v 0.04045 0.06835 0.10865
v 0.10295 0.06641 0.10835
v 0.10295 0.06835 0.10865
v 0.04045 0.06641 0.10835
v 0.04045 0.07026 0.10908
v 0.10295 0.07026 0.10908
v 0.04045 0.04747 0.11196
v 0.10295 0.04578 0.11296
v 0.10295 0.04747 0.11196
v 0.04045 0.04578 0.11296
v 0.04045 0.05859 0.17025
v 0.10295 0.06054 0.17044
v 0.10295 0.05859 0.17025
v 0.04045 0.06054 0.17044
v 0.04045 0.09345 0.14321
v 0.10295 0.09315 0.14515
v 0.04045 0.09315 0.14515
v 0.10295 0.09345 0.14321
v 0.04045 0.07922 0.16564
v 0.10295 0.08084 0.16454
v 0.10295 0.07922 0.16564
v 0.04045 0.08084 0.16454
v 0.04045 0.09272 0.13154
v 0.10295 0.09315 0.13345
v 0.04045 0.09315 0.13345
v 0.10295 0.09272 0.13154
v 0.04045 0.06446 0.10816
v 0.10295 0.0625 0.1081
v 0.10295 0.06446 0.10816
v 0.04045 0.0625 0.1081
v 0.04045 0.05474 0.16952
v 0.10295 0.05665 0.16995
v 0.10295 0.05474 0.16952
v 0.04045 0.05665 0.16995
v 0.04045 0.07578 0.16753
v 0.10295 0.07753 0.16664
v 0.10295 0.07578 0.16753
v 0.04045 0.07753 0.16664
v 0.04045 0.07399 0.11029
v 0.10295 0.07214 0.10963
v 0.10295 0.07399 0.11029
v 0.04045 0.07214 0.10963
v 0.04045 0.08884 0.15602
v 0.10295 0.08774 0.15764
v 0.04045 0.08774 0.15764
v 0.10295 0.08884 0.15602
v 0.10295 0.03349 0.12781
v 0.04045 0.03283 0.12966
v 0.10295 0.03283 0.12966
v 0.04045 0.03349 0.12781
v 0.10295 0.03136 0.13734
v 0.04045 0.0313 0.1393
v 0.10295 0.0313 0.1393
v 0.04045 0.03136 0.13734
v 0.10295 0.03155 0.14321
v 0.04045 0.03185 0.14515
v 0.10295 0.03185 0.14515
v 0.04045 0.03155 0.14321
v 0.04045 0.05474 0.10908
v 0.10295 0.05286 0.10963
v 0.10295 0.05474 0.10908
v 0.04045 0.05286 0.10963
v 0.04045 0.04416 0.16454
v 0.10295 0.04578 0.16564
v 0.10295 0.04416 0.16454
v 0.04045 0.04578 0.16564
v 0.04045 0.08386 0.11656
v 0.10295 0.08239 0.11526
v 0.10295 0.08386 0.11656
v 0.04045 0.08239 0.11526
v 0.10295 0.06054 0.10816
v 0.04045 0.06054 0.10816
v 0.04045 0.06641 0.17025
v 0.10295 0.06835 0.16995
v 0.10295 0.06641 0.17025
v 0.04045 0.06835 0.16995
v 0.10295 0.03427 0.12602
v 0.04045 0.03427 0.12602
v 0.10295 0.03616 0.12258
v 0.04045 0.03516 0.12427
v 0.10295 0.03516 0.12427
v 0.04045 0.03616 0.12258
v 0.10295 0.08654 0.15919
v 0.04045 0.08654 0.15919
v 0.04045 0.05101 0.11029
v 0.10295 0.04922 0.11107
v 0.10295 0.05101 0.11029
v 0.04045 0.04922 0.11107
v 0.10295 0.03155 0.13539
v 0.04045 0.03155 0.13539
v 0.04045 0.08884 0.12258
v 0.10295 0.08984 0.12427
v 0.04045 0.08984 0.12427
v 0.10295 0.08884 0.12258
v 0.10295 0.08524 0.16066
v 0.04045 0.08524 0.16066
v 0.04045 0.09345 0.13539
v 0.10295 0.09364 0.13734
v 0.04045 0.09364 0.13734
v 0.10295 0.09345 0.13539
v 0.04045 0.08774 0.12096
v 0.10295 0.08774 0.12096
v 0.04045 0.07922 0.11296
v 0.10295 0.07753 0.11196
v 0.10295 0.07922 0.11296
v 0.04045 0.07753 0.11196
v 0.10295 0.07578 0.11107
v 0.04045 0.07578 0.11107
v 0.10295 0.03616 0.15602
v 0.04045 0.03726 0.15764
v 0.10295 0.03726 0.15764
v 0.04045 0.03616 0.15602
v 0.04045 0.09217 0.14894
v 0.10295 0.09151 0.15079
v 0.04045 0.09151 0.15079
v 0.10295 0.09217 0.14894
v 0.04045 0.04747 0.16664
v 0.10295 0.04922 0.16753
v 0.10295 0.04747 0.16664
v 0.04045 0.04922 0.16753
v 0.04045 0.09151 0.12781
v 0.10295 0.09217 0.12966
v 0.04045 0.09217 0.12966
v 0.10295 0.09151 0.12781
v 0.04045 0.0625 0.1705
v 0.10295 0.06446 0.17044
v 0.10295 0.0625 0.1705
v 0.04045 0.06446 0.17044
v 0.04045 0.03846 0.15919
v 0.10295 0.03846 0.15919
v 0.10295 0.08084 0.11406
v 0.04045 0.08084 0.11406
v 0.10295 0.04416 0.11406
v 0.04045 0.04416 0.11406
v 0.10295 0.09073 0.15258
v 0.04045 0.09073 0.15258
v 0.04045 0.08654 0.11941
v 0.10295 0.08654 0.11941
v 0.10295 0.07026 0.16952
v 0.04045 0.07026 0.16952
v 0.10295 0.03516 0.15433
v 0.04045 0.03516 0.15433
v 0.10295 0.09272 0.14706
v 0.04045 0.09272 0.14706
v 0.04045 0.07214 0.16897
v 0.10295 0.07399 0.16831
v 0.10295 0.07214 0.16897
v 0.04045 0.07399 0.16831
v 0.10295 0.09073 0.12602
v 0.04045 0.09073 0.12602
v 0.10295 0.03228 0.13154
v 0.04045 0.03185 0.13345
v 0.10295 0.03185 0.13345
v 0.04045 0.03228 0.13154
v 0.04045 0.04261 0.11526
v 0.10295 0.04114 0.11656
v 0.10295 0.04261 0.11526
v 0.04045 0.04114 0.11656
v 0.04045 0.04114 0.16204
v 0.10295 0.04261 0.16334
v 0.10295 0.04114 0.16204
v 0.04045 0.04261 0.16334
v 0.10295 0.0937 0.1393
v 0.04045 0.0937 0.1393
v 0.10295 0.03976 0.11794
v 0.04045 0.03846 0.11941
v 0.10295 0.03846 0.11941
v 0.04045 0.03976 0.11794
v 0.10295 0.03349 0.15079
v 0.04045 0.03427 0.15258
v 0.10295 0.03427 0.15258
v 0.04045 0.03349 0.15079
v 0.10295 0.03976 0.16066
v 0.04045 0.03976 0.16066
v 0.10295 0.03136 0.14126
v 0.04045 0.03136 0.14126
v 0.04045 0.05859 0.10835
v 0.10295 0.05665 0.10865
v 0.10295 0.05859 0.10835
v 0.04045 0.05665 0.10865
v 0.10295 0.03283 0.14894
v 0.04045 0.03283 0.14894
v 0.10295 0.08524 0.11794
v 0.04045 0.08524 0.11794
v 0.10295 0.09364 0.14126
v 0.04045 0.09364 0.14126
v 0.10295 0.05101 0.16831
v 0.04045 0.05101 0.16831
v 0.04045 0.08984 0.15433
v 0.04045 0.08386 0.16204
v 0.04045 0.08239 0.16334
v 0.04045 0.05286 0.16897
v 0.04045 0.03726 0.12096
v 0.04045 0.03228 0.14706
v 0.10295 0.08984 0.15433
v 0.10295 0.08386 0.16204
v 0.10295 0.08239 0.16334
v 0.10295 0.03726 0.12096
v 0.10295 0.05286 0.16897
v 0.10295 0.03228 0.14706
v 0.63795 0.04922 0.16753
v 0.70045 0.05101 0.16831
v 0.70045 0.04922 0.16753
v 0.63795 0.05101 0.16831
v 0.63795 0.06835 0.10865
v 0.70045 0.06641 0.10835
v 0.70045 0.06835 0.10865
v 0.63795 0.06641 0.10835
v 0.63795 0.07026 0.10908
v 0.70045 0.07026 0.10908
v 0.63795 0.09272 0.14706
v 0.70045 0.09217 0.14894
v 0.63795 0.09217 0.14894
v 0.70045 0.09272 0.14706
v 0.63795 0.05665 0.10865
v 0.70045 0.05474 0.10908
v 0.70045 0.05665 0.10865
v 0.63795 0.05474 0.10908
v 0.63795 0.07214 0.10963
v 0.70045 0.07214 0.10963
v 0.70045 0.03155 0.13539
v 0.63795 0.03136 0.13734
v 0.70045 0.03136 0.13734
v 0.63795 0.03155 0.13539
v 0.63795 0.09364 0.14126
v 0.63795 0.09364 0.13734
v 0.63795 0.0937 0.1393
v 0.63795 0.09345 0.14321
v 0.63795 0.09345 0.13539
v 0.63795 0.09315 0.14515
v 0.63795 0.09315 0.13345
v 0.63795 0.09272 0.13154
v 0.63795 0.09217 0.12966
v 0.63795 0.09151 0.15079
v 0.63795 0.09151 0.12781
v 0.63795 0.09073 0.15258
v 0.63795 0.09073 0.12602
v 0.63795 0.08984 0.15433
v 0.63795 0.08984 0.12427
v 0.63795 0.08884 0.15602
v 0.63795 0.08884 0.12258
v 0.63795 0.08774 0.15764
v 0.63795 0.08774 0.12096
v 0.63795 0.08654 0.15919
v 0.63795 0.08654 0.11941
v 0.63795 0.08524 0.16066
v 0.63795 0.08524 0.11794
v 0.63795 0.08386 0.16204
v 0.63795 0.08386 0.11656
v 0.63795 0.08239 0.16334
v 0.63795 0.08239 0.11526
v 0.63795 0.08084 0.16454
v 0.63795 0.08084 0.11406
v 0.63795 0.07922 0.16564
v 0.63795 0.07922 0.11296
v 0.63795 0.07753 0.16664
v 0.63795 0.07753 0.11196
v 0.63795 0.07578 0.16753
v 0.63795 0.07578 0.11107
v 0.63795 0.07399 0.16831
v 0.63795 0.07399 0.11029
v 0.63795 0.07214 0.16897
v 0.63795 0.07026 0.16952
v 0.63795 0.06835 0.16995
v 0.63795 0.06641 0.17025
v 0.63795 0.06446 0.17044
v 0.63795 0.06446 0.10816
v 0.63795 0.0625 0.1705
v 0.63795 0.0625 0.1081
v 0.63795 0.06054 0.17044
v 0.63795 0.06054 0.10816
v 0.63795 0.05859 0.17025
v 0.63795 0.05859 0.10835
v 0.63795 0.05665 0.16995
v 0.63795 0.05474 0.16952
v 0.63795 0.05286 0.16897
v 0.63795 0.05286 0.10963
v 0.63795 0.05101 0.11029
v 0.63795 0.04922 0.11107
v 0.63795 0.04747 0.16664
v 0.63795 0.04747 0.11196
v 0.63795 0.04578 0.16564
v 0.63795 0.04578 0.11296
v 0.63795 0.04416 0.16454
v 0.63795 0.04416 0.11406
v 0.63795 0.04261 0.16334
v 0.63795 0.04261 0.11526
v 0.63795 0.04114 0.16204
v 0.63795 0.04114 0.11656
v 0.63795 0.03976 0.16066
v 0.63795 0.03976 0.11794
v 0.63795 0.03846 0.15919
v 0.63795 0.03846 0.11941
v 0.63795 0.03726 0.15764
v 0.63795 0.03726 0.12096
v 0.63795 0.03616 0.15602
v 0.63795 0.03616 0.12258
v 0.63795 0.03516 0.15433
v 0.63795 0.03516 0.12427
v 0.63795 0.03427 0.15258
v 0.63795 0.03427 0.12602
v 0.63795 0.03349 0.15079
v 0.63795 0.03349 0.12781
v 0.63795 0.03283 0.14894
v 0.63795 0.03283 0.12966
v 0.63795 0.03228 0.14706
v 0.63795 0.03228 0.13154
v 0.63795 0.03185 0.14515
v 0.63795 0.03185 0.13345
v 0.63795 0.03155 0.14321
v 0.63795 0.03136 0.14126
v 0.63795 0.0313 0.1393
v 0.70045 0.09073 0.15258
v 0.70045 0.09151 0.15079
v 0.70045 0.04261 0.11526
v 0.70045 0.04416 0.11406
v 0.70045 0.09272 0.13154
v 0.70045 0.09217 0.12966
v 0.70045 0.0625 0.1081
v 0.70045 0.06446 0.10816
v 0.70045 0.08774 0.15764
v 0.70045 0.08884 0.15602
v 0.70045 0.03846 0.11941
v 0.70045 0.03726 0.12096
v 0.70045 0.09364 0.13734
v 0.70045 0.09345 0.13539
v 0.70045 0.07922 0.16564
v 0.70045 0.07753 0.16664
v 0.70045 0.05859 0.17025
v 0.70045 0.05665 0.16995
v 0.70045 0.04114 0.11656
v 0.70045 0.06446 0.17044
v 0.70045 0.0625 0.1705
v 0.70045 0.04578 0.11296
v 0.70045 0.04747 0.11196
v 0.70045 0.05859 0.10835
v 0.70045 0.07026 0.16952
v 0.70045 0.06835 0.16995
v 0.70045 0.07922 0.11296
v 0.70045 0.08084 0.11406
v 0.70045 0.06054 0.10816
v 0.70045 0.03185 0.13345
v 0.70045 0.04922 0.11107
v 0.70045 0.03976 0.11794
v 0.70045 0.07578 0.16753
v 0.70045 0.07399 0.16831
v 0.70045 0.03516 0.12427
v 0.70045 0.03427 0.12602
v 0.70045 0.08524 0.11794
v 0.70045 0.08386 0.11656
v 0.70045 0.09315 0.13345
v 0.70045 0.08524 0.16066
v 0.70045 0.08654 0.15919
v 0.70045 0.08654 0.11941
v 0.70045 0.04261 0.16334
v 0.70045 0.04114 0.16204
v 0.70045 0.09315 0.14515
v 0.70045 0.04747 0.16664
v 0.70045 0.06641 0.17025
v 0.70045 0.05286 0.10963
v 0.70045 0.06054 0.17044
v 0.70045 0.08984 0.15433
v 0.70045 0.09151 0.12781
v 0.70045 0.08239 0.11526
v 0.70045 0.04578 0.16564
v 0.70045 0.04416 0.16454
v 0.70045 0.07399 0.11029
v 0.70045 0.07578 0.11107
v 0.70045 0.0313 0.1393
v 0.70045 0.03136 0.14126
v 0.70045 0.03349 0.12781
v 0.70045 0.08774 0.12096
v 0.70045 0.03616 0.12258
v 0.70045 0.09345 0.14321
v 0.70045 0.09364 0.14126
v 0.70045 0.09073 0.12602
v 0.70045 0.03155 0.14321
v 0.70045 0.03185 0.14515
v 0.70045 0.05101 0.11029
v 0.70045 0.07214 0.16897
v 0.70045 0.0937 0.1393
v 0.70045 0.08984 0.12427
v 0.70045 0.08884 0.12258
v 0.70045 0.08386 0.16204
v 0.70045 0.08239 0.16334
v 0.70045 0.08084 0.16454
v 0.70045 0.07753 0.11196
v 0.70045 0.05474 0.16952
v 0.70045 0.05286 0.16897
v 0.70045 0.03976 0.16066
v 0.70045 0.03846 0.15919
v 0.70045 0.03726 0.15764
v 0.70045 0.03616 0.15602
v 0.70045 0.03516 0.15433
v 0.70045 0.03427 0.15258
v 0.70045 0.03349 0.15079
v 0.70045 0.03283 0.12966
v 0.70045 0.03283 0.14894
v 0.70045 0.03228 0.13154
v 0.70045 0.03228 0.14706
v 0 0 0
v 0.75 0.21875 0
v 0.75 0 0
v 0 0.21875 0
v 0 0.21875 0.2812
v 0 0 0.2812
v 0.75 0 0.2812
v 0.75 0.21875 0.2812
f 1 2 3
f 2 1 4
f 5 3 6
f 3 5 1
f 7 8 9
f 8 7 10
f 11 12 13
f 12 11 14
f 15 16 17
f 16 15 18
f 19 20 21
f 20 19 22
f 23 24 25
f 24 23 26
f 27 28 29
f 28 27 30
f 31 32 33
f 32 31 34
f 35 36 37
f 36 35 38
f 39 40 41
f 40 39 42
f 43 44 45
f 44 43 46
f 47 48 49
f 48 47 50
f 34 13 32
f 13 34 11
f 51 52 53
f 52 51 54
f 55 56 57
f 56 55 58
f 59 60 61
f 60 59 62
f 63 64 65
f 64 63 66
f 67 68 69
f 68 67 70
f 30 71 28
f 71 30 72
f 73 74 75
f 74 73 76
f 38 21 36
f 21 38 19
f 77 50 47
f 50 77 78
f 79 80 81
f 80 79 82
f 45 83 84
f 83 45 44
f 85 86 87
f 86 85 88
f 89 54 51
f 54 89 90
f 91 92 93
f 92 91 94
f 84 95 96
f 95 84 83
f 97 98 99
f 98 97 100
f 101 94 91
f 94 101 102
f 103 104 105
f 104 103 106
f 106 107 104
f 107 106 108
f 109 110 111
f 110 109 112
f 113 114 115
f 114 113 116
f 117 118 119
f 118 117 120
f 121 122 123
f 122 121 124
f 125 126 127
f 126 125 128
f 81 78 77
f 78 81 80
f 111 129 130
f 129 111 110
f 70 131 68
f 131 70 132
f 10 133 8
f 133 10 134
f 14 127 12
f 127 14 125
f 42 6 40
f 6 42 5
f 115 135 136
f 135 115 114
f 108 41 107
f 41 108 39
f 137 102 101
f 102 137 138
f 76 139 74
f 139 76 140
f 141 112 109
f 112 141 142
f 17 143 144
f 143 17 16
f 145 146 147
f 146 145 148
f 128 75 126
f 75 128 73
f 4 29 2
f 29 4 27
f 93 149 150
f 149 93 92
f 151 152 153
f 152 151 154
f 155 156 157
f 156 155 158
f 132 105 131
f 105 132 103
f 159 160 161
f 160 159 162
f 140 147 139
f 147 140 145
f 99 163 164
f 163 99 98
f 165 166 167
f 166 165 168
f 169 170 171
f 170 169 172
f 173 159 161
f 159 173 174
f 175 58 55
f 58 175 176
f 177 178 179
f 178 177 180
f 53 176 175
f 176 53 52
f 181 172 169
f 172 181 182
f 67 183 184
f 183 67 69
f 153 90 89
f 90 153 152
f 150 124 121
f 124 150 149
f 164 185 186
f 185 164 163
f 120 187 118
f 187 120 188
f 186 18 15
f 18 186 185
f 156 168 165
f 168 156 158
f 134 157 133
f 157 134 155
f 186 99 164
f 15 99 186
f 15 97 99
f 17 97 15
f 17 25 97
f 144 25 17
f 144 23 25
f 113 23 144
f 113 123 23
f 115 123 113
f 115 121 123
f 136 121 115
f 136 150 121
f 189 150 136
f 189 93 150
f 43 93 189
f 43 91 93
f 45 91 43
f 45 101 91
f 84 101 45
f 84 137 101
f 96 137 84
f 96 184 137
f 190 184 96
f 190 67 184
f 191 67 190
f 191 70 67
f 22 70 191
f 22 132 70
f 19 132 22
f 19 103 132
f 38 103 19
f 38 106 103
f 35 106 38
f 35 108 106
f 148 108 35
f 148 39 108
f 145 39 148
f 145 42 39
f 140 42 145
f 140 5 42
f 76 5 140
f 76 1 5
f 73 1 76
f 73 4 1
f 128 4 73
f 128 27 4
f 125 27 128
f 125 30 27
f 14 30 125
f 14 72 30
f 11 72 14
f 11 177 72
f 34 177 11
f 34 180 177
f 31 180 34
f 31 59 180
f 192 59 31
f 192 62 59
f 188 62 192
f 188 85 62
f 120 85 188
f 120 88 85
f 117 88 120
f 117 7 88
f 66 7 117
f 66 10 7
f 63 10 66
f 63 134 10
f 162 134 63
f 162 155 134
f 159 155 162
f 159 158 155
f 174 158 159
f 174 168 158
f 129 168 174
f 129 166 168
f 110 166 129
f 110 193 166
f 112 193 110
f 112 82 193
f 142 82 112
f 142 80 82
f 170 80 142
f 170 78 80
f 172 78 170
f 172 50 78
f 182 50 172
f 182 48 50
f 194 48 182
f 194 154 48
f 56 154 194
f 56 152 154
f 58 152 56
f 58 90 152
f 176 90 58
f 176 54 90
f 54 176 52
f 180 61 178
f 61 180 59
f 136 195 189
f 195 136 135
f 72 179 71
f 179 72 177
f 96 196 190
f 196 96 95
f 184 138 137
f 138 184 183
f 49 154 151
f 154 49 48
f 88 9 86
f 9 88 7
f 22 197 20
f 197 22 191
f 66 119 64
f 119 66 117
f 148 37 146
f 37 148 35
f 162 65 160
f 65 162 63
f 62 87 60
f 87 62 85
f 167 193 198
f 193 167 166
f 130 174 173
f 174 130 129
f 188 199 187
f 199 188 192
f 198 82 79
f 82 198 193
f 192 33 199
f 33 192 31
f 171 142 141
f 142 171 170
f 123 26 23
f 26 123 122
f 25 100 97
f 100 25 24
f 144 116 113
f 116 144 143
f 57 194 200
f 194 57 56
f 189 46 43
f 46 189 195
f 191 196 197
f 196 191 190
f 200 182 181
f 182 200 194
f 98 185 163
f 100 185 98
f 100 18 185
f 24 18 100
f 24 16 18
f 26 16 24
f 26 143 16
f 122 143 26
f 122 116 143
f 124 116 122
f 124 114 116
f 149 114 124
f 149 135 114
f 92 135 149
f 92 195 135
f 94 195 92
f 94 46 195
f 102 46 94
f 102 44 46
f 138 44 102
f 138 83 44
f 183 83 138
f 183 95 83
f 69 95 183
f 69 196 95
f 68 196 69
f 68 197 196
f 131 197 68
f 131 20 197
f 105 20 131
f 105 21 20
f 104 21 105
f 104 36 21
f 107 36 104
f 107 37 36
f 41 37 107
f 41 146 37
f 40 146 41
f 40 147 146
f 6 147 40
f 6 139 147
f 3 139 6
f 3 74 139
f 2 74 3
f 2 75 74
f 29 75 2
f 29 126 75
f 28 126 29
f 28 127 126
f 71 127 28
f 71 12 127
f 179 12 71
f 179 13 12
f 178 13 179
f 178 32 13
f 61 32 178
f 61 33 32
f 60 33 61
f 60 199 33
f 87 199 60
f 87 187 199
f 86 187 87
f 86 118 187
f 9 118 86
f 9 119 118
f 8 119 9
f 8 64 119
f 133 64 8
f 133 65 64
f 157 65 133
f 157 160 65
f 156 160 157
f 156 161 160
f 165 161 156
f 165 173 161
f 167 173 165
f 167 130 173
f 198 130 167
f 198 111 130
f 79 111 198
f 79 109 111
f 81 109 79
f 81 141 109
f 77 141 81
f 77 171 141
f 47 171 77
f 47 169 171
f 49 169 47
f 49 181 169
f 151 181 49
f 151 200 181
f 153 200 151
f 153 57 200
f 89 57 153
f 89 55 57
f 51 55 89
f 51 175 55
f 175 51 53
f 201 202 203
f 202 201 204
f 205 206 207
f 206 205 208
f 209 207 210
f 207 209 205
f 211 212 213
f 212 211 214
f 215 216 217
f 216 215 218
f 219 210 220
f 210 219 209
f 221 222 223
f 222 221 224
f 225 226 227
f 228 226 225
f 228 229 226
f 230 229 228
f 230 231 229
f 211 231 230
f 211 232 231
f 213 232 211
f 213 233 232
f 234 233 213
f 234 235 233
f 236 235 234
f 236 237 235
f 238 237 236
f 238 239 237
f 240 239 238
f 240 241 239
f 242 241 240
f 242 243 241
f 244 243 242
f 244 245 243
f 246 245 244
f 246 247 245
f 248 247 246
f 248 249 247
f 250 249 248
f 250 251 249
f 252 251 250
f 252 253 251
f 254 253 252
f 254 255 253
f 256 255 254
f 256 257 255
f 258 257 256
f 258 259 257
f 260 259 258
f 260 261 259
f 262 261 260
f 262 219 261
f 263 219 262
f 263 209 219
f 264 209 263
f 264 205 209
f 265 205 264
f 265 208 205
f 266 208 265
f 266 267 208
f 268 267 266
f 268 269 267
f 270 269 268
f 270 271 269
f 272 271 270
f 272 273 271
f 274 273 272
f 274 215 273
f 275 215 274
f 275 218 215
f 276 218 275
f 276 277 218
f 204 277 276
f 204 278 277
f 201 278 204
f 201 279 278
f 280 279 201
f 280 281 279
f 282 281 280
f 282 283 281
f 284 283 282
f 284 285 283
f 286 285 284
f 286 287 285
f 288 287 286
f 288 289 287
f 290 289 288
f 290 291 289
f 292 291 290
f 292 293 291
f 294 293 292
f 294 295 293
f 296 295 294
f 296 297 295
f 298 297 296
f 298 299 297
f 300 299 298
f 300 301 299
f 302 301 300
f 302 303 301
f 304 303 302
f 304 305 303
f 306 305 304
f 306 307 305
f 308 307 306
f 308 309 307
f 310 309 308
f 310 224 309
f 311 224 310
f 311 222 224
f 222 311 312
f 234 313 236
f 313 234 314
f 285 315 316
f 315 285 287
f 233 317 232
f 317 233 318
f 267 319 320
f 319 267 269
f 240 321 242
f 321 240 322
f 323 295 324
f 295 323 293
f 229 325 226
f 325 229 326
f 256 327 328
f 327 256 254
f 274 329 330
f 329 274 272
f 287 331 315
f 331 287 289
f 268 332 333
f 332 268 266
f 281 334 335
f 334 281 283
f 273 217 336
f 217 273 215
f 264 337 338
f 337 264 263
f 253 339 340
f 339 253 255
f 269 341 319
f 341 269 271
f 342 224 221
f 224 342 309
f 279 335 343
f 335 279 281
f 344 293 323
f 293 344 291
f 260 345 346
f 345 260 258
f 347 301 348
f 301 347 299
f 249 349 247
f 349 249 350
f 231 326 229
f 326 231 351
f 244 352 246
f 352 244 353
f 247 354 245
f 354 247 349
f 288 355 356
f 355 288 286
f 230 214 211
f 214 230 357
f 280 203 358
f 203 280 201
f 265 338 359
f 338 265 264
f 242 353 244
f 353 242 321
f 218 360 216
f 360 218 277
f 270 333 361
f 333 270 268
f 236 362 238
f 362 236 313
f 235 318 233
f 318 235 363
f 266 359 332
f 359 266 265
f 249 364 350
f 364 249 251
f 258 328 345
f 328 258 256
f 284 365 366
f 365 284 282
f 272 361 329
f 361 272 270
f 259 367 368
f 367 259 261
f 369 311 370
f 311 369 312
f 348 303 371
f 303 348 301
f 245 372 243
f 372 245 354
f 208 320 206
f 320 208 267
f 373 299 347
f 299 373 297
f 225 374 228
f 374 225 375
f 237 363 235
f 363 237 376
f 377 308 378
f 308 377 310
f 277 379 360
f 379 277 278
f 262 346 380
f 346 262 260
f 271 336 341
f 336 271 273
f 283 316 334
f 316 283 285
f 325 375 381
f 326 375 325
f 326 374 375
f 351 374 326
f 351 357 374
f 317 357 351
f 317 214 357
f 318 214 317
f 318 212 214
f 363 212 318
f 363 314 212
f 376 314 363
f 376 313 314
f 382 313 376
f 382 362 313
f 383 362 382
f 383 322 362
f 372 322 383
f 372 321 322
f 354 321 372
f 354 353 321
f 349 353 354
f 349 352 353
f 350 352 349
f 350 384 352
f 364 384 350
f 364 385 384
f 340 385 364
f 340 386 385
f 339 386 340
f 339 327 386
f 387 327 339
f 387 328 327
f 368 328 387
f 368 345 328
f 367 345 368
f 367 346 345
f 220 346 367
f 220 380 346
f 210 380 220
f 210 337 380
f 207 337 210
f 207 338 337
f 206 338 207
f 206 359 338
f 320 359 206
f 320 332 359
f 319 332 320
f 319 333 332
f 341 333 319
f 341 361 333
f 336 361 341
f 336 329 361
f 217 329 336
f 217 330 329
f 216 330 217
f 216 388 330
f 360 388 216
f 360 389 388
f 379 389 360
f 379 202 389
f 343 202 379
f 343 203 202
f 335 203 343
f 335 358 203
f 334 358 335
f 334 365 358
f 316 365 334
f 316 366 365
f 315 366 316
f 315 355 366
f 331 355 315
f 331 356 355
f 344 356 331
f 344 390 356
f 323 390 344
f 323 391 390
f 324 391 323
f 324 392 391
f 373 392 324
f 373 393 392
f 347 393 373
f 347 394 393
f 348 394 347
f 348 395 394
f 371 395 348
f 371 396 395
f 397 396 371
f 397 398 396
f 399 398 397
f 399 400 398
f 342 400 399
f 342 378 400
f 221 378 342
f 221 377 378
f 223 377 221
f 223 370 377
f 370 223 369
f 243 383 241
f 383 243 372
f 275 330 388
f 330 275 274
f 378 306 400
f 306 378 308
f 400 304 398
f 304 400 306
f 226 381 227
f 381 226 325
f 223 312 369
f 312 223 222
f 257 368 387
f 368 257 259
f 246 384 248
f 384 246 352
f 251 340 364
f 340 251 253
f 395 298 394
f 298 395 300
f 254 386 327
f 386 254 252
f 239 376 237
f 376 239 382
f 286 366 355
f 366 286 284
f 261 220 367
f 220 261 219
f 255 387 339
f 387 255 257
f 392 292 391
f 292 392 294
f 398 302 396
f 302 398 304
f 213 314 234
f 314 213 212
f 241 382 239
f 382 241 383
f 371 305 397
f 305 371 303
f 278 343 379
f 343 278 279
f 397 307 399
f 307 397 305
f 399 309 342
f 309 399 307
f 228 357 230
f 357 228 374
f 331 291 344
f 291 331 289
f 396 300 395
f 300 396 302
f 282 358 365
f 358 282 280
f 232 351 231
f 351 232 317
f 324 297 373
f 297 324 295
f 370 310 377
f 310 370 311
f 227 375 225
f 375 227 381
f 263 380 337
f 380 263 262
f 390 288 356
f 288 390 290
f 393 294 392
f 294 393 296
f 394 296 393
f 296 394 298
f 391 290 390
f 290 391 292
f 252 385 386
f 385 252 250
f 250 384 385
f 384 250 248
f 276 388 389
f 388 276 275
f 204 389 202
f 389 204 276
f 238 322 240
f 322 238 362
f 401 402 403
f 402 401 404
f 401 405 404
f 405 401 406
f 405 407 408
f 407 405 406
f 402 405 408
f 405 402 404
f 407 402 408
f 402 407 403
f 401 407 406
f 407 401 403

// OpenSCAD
// Parametric dimensions
length = 0.75;
width = 0.21875;
height = 0.28125;
extrusion_depth = 0.2812;          // main extrusion depth from base datum

// Remove-material feature parameters
hole1_x = 0.0717;                  // first circular axis from left edge
hole2_x = 0.6692;                  // second circular axis from left edge
hole_y = 0.0625;                   // both axes from front edge
hole_z_bottom = 0.1081;            // bottom of removed band above underside
hole_z_top = 0.1705;               // top of removed band above underside
hole_radius = 0.0312;
hole_length = 0.0625;              // cut depth along X axis
$fn = 100;

// Base datum is Z=0; extrude upward to fill full footprint with zero edge offsets
module base_block() {
    linear_extrude(height = extrusion_depth)
        square([length, width]);
}

// Two separate circular profiles oriented along X
// Side outline remains arched (circular) rather than a connected rectangular notch
module remove_material() {
    hole_z_center = (hole_z_bottom + hole_z_top) / 2;

    // First circular pocket
    translate([hole1_x, hole_y, hole_z_center])
        rotate([0, 90, 0])
            cylinder(h = hole_length, r = hole_radius, center = true);

    // Second circular pocket
    translate([hole2_x, hole_y, hole_z_center])
        rotate([0, 90, 0])
            cylinder(h = hole_length, r = hole_radius, center = true);
}

// Main assembly: subtract the two circular features from the solid base
difference() {
    base_block();
    remove_material();
}
